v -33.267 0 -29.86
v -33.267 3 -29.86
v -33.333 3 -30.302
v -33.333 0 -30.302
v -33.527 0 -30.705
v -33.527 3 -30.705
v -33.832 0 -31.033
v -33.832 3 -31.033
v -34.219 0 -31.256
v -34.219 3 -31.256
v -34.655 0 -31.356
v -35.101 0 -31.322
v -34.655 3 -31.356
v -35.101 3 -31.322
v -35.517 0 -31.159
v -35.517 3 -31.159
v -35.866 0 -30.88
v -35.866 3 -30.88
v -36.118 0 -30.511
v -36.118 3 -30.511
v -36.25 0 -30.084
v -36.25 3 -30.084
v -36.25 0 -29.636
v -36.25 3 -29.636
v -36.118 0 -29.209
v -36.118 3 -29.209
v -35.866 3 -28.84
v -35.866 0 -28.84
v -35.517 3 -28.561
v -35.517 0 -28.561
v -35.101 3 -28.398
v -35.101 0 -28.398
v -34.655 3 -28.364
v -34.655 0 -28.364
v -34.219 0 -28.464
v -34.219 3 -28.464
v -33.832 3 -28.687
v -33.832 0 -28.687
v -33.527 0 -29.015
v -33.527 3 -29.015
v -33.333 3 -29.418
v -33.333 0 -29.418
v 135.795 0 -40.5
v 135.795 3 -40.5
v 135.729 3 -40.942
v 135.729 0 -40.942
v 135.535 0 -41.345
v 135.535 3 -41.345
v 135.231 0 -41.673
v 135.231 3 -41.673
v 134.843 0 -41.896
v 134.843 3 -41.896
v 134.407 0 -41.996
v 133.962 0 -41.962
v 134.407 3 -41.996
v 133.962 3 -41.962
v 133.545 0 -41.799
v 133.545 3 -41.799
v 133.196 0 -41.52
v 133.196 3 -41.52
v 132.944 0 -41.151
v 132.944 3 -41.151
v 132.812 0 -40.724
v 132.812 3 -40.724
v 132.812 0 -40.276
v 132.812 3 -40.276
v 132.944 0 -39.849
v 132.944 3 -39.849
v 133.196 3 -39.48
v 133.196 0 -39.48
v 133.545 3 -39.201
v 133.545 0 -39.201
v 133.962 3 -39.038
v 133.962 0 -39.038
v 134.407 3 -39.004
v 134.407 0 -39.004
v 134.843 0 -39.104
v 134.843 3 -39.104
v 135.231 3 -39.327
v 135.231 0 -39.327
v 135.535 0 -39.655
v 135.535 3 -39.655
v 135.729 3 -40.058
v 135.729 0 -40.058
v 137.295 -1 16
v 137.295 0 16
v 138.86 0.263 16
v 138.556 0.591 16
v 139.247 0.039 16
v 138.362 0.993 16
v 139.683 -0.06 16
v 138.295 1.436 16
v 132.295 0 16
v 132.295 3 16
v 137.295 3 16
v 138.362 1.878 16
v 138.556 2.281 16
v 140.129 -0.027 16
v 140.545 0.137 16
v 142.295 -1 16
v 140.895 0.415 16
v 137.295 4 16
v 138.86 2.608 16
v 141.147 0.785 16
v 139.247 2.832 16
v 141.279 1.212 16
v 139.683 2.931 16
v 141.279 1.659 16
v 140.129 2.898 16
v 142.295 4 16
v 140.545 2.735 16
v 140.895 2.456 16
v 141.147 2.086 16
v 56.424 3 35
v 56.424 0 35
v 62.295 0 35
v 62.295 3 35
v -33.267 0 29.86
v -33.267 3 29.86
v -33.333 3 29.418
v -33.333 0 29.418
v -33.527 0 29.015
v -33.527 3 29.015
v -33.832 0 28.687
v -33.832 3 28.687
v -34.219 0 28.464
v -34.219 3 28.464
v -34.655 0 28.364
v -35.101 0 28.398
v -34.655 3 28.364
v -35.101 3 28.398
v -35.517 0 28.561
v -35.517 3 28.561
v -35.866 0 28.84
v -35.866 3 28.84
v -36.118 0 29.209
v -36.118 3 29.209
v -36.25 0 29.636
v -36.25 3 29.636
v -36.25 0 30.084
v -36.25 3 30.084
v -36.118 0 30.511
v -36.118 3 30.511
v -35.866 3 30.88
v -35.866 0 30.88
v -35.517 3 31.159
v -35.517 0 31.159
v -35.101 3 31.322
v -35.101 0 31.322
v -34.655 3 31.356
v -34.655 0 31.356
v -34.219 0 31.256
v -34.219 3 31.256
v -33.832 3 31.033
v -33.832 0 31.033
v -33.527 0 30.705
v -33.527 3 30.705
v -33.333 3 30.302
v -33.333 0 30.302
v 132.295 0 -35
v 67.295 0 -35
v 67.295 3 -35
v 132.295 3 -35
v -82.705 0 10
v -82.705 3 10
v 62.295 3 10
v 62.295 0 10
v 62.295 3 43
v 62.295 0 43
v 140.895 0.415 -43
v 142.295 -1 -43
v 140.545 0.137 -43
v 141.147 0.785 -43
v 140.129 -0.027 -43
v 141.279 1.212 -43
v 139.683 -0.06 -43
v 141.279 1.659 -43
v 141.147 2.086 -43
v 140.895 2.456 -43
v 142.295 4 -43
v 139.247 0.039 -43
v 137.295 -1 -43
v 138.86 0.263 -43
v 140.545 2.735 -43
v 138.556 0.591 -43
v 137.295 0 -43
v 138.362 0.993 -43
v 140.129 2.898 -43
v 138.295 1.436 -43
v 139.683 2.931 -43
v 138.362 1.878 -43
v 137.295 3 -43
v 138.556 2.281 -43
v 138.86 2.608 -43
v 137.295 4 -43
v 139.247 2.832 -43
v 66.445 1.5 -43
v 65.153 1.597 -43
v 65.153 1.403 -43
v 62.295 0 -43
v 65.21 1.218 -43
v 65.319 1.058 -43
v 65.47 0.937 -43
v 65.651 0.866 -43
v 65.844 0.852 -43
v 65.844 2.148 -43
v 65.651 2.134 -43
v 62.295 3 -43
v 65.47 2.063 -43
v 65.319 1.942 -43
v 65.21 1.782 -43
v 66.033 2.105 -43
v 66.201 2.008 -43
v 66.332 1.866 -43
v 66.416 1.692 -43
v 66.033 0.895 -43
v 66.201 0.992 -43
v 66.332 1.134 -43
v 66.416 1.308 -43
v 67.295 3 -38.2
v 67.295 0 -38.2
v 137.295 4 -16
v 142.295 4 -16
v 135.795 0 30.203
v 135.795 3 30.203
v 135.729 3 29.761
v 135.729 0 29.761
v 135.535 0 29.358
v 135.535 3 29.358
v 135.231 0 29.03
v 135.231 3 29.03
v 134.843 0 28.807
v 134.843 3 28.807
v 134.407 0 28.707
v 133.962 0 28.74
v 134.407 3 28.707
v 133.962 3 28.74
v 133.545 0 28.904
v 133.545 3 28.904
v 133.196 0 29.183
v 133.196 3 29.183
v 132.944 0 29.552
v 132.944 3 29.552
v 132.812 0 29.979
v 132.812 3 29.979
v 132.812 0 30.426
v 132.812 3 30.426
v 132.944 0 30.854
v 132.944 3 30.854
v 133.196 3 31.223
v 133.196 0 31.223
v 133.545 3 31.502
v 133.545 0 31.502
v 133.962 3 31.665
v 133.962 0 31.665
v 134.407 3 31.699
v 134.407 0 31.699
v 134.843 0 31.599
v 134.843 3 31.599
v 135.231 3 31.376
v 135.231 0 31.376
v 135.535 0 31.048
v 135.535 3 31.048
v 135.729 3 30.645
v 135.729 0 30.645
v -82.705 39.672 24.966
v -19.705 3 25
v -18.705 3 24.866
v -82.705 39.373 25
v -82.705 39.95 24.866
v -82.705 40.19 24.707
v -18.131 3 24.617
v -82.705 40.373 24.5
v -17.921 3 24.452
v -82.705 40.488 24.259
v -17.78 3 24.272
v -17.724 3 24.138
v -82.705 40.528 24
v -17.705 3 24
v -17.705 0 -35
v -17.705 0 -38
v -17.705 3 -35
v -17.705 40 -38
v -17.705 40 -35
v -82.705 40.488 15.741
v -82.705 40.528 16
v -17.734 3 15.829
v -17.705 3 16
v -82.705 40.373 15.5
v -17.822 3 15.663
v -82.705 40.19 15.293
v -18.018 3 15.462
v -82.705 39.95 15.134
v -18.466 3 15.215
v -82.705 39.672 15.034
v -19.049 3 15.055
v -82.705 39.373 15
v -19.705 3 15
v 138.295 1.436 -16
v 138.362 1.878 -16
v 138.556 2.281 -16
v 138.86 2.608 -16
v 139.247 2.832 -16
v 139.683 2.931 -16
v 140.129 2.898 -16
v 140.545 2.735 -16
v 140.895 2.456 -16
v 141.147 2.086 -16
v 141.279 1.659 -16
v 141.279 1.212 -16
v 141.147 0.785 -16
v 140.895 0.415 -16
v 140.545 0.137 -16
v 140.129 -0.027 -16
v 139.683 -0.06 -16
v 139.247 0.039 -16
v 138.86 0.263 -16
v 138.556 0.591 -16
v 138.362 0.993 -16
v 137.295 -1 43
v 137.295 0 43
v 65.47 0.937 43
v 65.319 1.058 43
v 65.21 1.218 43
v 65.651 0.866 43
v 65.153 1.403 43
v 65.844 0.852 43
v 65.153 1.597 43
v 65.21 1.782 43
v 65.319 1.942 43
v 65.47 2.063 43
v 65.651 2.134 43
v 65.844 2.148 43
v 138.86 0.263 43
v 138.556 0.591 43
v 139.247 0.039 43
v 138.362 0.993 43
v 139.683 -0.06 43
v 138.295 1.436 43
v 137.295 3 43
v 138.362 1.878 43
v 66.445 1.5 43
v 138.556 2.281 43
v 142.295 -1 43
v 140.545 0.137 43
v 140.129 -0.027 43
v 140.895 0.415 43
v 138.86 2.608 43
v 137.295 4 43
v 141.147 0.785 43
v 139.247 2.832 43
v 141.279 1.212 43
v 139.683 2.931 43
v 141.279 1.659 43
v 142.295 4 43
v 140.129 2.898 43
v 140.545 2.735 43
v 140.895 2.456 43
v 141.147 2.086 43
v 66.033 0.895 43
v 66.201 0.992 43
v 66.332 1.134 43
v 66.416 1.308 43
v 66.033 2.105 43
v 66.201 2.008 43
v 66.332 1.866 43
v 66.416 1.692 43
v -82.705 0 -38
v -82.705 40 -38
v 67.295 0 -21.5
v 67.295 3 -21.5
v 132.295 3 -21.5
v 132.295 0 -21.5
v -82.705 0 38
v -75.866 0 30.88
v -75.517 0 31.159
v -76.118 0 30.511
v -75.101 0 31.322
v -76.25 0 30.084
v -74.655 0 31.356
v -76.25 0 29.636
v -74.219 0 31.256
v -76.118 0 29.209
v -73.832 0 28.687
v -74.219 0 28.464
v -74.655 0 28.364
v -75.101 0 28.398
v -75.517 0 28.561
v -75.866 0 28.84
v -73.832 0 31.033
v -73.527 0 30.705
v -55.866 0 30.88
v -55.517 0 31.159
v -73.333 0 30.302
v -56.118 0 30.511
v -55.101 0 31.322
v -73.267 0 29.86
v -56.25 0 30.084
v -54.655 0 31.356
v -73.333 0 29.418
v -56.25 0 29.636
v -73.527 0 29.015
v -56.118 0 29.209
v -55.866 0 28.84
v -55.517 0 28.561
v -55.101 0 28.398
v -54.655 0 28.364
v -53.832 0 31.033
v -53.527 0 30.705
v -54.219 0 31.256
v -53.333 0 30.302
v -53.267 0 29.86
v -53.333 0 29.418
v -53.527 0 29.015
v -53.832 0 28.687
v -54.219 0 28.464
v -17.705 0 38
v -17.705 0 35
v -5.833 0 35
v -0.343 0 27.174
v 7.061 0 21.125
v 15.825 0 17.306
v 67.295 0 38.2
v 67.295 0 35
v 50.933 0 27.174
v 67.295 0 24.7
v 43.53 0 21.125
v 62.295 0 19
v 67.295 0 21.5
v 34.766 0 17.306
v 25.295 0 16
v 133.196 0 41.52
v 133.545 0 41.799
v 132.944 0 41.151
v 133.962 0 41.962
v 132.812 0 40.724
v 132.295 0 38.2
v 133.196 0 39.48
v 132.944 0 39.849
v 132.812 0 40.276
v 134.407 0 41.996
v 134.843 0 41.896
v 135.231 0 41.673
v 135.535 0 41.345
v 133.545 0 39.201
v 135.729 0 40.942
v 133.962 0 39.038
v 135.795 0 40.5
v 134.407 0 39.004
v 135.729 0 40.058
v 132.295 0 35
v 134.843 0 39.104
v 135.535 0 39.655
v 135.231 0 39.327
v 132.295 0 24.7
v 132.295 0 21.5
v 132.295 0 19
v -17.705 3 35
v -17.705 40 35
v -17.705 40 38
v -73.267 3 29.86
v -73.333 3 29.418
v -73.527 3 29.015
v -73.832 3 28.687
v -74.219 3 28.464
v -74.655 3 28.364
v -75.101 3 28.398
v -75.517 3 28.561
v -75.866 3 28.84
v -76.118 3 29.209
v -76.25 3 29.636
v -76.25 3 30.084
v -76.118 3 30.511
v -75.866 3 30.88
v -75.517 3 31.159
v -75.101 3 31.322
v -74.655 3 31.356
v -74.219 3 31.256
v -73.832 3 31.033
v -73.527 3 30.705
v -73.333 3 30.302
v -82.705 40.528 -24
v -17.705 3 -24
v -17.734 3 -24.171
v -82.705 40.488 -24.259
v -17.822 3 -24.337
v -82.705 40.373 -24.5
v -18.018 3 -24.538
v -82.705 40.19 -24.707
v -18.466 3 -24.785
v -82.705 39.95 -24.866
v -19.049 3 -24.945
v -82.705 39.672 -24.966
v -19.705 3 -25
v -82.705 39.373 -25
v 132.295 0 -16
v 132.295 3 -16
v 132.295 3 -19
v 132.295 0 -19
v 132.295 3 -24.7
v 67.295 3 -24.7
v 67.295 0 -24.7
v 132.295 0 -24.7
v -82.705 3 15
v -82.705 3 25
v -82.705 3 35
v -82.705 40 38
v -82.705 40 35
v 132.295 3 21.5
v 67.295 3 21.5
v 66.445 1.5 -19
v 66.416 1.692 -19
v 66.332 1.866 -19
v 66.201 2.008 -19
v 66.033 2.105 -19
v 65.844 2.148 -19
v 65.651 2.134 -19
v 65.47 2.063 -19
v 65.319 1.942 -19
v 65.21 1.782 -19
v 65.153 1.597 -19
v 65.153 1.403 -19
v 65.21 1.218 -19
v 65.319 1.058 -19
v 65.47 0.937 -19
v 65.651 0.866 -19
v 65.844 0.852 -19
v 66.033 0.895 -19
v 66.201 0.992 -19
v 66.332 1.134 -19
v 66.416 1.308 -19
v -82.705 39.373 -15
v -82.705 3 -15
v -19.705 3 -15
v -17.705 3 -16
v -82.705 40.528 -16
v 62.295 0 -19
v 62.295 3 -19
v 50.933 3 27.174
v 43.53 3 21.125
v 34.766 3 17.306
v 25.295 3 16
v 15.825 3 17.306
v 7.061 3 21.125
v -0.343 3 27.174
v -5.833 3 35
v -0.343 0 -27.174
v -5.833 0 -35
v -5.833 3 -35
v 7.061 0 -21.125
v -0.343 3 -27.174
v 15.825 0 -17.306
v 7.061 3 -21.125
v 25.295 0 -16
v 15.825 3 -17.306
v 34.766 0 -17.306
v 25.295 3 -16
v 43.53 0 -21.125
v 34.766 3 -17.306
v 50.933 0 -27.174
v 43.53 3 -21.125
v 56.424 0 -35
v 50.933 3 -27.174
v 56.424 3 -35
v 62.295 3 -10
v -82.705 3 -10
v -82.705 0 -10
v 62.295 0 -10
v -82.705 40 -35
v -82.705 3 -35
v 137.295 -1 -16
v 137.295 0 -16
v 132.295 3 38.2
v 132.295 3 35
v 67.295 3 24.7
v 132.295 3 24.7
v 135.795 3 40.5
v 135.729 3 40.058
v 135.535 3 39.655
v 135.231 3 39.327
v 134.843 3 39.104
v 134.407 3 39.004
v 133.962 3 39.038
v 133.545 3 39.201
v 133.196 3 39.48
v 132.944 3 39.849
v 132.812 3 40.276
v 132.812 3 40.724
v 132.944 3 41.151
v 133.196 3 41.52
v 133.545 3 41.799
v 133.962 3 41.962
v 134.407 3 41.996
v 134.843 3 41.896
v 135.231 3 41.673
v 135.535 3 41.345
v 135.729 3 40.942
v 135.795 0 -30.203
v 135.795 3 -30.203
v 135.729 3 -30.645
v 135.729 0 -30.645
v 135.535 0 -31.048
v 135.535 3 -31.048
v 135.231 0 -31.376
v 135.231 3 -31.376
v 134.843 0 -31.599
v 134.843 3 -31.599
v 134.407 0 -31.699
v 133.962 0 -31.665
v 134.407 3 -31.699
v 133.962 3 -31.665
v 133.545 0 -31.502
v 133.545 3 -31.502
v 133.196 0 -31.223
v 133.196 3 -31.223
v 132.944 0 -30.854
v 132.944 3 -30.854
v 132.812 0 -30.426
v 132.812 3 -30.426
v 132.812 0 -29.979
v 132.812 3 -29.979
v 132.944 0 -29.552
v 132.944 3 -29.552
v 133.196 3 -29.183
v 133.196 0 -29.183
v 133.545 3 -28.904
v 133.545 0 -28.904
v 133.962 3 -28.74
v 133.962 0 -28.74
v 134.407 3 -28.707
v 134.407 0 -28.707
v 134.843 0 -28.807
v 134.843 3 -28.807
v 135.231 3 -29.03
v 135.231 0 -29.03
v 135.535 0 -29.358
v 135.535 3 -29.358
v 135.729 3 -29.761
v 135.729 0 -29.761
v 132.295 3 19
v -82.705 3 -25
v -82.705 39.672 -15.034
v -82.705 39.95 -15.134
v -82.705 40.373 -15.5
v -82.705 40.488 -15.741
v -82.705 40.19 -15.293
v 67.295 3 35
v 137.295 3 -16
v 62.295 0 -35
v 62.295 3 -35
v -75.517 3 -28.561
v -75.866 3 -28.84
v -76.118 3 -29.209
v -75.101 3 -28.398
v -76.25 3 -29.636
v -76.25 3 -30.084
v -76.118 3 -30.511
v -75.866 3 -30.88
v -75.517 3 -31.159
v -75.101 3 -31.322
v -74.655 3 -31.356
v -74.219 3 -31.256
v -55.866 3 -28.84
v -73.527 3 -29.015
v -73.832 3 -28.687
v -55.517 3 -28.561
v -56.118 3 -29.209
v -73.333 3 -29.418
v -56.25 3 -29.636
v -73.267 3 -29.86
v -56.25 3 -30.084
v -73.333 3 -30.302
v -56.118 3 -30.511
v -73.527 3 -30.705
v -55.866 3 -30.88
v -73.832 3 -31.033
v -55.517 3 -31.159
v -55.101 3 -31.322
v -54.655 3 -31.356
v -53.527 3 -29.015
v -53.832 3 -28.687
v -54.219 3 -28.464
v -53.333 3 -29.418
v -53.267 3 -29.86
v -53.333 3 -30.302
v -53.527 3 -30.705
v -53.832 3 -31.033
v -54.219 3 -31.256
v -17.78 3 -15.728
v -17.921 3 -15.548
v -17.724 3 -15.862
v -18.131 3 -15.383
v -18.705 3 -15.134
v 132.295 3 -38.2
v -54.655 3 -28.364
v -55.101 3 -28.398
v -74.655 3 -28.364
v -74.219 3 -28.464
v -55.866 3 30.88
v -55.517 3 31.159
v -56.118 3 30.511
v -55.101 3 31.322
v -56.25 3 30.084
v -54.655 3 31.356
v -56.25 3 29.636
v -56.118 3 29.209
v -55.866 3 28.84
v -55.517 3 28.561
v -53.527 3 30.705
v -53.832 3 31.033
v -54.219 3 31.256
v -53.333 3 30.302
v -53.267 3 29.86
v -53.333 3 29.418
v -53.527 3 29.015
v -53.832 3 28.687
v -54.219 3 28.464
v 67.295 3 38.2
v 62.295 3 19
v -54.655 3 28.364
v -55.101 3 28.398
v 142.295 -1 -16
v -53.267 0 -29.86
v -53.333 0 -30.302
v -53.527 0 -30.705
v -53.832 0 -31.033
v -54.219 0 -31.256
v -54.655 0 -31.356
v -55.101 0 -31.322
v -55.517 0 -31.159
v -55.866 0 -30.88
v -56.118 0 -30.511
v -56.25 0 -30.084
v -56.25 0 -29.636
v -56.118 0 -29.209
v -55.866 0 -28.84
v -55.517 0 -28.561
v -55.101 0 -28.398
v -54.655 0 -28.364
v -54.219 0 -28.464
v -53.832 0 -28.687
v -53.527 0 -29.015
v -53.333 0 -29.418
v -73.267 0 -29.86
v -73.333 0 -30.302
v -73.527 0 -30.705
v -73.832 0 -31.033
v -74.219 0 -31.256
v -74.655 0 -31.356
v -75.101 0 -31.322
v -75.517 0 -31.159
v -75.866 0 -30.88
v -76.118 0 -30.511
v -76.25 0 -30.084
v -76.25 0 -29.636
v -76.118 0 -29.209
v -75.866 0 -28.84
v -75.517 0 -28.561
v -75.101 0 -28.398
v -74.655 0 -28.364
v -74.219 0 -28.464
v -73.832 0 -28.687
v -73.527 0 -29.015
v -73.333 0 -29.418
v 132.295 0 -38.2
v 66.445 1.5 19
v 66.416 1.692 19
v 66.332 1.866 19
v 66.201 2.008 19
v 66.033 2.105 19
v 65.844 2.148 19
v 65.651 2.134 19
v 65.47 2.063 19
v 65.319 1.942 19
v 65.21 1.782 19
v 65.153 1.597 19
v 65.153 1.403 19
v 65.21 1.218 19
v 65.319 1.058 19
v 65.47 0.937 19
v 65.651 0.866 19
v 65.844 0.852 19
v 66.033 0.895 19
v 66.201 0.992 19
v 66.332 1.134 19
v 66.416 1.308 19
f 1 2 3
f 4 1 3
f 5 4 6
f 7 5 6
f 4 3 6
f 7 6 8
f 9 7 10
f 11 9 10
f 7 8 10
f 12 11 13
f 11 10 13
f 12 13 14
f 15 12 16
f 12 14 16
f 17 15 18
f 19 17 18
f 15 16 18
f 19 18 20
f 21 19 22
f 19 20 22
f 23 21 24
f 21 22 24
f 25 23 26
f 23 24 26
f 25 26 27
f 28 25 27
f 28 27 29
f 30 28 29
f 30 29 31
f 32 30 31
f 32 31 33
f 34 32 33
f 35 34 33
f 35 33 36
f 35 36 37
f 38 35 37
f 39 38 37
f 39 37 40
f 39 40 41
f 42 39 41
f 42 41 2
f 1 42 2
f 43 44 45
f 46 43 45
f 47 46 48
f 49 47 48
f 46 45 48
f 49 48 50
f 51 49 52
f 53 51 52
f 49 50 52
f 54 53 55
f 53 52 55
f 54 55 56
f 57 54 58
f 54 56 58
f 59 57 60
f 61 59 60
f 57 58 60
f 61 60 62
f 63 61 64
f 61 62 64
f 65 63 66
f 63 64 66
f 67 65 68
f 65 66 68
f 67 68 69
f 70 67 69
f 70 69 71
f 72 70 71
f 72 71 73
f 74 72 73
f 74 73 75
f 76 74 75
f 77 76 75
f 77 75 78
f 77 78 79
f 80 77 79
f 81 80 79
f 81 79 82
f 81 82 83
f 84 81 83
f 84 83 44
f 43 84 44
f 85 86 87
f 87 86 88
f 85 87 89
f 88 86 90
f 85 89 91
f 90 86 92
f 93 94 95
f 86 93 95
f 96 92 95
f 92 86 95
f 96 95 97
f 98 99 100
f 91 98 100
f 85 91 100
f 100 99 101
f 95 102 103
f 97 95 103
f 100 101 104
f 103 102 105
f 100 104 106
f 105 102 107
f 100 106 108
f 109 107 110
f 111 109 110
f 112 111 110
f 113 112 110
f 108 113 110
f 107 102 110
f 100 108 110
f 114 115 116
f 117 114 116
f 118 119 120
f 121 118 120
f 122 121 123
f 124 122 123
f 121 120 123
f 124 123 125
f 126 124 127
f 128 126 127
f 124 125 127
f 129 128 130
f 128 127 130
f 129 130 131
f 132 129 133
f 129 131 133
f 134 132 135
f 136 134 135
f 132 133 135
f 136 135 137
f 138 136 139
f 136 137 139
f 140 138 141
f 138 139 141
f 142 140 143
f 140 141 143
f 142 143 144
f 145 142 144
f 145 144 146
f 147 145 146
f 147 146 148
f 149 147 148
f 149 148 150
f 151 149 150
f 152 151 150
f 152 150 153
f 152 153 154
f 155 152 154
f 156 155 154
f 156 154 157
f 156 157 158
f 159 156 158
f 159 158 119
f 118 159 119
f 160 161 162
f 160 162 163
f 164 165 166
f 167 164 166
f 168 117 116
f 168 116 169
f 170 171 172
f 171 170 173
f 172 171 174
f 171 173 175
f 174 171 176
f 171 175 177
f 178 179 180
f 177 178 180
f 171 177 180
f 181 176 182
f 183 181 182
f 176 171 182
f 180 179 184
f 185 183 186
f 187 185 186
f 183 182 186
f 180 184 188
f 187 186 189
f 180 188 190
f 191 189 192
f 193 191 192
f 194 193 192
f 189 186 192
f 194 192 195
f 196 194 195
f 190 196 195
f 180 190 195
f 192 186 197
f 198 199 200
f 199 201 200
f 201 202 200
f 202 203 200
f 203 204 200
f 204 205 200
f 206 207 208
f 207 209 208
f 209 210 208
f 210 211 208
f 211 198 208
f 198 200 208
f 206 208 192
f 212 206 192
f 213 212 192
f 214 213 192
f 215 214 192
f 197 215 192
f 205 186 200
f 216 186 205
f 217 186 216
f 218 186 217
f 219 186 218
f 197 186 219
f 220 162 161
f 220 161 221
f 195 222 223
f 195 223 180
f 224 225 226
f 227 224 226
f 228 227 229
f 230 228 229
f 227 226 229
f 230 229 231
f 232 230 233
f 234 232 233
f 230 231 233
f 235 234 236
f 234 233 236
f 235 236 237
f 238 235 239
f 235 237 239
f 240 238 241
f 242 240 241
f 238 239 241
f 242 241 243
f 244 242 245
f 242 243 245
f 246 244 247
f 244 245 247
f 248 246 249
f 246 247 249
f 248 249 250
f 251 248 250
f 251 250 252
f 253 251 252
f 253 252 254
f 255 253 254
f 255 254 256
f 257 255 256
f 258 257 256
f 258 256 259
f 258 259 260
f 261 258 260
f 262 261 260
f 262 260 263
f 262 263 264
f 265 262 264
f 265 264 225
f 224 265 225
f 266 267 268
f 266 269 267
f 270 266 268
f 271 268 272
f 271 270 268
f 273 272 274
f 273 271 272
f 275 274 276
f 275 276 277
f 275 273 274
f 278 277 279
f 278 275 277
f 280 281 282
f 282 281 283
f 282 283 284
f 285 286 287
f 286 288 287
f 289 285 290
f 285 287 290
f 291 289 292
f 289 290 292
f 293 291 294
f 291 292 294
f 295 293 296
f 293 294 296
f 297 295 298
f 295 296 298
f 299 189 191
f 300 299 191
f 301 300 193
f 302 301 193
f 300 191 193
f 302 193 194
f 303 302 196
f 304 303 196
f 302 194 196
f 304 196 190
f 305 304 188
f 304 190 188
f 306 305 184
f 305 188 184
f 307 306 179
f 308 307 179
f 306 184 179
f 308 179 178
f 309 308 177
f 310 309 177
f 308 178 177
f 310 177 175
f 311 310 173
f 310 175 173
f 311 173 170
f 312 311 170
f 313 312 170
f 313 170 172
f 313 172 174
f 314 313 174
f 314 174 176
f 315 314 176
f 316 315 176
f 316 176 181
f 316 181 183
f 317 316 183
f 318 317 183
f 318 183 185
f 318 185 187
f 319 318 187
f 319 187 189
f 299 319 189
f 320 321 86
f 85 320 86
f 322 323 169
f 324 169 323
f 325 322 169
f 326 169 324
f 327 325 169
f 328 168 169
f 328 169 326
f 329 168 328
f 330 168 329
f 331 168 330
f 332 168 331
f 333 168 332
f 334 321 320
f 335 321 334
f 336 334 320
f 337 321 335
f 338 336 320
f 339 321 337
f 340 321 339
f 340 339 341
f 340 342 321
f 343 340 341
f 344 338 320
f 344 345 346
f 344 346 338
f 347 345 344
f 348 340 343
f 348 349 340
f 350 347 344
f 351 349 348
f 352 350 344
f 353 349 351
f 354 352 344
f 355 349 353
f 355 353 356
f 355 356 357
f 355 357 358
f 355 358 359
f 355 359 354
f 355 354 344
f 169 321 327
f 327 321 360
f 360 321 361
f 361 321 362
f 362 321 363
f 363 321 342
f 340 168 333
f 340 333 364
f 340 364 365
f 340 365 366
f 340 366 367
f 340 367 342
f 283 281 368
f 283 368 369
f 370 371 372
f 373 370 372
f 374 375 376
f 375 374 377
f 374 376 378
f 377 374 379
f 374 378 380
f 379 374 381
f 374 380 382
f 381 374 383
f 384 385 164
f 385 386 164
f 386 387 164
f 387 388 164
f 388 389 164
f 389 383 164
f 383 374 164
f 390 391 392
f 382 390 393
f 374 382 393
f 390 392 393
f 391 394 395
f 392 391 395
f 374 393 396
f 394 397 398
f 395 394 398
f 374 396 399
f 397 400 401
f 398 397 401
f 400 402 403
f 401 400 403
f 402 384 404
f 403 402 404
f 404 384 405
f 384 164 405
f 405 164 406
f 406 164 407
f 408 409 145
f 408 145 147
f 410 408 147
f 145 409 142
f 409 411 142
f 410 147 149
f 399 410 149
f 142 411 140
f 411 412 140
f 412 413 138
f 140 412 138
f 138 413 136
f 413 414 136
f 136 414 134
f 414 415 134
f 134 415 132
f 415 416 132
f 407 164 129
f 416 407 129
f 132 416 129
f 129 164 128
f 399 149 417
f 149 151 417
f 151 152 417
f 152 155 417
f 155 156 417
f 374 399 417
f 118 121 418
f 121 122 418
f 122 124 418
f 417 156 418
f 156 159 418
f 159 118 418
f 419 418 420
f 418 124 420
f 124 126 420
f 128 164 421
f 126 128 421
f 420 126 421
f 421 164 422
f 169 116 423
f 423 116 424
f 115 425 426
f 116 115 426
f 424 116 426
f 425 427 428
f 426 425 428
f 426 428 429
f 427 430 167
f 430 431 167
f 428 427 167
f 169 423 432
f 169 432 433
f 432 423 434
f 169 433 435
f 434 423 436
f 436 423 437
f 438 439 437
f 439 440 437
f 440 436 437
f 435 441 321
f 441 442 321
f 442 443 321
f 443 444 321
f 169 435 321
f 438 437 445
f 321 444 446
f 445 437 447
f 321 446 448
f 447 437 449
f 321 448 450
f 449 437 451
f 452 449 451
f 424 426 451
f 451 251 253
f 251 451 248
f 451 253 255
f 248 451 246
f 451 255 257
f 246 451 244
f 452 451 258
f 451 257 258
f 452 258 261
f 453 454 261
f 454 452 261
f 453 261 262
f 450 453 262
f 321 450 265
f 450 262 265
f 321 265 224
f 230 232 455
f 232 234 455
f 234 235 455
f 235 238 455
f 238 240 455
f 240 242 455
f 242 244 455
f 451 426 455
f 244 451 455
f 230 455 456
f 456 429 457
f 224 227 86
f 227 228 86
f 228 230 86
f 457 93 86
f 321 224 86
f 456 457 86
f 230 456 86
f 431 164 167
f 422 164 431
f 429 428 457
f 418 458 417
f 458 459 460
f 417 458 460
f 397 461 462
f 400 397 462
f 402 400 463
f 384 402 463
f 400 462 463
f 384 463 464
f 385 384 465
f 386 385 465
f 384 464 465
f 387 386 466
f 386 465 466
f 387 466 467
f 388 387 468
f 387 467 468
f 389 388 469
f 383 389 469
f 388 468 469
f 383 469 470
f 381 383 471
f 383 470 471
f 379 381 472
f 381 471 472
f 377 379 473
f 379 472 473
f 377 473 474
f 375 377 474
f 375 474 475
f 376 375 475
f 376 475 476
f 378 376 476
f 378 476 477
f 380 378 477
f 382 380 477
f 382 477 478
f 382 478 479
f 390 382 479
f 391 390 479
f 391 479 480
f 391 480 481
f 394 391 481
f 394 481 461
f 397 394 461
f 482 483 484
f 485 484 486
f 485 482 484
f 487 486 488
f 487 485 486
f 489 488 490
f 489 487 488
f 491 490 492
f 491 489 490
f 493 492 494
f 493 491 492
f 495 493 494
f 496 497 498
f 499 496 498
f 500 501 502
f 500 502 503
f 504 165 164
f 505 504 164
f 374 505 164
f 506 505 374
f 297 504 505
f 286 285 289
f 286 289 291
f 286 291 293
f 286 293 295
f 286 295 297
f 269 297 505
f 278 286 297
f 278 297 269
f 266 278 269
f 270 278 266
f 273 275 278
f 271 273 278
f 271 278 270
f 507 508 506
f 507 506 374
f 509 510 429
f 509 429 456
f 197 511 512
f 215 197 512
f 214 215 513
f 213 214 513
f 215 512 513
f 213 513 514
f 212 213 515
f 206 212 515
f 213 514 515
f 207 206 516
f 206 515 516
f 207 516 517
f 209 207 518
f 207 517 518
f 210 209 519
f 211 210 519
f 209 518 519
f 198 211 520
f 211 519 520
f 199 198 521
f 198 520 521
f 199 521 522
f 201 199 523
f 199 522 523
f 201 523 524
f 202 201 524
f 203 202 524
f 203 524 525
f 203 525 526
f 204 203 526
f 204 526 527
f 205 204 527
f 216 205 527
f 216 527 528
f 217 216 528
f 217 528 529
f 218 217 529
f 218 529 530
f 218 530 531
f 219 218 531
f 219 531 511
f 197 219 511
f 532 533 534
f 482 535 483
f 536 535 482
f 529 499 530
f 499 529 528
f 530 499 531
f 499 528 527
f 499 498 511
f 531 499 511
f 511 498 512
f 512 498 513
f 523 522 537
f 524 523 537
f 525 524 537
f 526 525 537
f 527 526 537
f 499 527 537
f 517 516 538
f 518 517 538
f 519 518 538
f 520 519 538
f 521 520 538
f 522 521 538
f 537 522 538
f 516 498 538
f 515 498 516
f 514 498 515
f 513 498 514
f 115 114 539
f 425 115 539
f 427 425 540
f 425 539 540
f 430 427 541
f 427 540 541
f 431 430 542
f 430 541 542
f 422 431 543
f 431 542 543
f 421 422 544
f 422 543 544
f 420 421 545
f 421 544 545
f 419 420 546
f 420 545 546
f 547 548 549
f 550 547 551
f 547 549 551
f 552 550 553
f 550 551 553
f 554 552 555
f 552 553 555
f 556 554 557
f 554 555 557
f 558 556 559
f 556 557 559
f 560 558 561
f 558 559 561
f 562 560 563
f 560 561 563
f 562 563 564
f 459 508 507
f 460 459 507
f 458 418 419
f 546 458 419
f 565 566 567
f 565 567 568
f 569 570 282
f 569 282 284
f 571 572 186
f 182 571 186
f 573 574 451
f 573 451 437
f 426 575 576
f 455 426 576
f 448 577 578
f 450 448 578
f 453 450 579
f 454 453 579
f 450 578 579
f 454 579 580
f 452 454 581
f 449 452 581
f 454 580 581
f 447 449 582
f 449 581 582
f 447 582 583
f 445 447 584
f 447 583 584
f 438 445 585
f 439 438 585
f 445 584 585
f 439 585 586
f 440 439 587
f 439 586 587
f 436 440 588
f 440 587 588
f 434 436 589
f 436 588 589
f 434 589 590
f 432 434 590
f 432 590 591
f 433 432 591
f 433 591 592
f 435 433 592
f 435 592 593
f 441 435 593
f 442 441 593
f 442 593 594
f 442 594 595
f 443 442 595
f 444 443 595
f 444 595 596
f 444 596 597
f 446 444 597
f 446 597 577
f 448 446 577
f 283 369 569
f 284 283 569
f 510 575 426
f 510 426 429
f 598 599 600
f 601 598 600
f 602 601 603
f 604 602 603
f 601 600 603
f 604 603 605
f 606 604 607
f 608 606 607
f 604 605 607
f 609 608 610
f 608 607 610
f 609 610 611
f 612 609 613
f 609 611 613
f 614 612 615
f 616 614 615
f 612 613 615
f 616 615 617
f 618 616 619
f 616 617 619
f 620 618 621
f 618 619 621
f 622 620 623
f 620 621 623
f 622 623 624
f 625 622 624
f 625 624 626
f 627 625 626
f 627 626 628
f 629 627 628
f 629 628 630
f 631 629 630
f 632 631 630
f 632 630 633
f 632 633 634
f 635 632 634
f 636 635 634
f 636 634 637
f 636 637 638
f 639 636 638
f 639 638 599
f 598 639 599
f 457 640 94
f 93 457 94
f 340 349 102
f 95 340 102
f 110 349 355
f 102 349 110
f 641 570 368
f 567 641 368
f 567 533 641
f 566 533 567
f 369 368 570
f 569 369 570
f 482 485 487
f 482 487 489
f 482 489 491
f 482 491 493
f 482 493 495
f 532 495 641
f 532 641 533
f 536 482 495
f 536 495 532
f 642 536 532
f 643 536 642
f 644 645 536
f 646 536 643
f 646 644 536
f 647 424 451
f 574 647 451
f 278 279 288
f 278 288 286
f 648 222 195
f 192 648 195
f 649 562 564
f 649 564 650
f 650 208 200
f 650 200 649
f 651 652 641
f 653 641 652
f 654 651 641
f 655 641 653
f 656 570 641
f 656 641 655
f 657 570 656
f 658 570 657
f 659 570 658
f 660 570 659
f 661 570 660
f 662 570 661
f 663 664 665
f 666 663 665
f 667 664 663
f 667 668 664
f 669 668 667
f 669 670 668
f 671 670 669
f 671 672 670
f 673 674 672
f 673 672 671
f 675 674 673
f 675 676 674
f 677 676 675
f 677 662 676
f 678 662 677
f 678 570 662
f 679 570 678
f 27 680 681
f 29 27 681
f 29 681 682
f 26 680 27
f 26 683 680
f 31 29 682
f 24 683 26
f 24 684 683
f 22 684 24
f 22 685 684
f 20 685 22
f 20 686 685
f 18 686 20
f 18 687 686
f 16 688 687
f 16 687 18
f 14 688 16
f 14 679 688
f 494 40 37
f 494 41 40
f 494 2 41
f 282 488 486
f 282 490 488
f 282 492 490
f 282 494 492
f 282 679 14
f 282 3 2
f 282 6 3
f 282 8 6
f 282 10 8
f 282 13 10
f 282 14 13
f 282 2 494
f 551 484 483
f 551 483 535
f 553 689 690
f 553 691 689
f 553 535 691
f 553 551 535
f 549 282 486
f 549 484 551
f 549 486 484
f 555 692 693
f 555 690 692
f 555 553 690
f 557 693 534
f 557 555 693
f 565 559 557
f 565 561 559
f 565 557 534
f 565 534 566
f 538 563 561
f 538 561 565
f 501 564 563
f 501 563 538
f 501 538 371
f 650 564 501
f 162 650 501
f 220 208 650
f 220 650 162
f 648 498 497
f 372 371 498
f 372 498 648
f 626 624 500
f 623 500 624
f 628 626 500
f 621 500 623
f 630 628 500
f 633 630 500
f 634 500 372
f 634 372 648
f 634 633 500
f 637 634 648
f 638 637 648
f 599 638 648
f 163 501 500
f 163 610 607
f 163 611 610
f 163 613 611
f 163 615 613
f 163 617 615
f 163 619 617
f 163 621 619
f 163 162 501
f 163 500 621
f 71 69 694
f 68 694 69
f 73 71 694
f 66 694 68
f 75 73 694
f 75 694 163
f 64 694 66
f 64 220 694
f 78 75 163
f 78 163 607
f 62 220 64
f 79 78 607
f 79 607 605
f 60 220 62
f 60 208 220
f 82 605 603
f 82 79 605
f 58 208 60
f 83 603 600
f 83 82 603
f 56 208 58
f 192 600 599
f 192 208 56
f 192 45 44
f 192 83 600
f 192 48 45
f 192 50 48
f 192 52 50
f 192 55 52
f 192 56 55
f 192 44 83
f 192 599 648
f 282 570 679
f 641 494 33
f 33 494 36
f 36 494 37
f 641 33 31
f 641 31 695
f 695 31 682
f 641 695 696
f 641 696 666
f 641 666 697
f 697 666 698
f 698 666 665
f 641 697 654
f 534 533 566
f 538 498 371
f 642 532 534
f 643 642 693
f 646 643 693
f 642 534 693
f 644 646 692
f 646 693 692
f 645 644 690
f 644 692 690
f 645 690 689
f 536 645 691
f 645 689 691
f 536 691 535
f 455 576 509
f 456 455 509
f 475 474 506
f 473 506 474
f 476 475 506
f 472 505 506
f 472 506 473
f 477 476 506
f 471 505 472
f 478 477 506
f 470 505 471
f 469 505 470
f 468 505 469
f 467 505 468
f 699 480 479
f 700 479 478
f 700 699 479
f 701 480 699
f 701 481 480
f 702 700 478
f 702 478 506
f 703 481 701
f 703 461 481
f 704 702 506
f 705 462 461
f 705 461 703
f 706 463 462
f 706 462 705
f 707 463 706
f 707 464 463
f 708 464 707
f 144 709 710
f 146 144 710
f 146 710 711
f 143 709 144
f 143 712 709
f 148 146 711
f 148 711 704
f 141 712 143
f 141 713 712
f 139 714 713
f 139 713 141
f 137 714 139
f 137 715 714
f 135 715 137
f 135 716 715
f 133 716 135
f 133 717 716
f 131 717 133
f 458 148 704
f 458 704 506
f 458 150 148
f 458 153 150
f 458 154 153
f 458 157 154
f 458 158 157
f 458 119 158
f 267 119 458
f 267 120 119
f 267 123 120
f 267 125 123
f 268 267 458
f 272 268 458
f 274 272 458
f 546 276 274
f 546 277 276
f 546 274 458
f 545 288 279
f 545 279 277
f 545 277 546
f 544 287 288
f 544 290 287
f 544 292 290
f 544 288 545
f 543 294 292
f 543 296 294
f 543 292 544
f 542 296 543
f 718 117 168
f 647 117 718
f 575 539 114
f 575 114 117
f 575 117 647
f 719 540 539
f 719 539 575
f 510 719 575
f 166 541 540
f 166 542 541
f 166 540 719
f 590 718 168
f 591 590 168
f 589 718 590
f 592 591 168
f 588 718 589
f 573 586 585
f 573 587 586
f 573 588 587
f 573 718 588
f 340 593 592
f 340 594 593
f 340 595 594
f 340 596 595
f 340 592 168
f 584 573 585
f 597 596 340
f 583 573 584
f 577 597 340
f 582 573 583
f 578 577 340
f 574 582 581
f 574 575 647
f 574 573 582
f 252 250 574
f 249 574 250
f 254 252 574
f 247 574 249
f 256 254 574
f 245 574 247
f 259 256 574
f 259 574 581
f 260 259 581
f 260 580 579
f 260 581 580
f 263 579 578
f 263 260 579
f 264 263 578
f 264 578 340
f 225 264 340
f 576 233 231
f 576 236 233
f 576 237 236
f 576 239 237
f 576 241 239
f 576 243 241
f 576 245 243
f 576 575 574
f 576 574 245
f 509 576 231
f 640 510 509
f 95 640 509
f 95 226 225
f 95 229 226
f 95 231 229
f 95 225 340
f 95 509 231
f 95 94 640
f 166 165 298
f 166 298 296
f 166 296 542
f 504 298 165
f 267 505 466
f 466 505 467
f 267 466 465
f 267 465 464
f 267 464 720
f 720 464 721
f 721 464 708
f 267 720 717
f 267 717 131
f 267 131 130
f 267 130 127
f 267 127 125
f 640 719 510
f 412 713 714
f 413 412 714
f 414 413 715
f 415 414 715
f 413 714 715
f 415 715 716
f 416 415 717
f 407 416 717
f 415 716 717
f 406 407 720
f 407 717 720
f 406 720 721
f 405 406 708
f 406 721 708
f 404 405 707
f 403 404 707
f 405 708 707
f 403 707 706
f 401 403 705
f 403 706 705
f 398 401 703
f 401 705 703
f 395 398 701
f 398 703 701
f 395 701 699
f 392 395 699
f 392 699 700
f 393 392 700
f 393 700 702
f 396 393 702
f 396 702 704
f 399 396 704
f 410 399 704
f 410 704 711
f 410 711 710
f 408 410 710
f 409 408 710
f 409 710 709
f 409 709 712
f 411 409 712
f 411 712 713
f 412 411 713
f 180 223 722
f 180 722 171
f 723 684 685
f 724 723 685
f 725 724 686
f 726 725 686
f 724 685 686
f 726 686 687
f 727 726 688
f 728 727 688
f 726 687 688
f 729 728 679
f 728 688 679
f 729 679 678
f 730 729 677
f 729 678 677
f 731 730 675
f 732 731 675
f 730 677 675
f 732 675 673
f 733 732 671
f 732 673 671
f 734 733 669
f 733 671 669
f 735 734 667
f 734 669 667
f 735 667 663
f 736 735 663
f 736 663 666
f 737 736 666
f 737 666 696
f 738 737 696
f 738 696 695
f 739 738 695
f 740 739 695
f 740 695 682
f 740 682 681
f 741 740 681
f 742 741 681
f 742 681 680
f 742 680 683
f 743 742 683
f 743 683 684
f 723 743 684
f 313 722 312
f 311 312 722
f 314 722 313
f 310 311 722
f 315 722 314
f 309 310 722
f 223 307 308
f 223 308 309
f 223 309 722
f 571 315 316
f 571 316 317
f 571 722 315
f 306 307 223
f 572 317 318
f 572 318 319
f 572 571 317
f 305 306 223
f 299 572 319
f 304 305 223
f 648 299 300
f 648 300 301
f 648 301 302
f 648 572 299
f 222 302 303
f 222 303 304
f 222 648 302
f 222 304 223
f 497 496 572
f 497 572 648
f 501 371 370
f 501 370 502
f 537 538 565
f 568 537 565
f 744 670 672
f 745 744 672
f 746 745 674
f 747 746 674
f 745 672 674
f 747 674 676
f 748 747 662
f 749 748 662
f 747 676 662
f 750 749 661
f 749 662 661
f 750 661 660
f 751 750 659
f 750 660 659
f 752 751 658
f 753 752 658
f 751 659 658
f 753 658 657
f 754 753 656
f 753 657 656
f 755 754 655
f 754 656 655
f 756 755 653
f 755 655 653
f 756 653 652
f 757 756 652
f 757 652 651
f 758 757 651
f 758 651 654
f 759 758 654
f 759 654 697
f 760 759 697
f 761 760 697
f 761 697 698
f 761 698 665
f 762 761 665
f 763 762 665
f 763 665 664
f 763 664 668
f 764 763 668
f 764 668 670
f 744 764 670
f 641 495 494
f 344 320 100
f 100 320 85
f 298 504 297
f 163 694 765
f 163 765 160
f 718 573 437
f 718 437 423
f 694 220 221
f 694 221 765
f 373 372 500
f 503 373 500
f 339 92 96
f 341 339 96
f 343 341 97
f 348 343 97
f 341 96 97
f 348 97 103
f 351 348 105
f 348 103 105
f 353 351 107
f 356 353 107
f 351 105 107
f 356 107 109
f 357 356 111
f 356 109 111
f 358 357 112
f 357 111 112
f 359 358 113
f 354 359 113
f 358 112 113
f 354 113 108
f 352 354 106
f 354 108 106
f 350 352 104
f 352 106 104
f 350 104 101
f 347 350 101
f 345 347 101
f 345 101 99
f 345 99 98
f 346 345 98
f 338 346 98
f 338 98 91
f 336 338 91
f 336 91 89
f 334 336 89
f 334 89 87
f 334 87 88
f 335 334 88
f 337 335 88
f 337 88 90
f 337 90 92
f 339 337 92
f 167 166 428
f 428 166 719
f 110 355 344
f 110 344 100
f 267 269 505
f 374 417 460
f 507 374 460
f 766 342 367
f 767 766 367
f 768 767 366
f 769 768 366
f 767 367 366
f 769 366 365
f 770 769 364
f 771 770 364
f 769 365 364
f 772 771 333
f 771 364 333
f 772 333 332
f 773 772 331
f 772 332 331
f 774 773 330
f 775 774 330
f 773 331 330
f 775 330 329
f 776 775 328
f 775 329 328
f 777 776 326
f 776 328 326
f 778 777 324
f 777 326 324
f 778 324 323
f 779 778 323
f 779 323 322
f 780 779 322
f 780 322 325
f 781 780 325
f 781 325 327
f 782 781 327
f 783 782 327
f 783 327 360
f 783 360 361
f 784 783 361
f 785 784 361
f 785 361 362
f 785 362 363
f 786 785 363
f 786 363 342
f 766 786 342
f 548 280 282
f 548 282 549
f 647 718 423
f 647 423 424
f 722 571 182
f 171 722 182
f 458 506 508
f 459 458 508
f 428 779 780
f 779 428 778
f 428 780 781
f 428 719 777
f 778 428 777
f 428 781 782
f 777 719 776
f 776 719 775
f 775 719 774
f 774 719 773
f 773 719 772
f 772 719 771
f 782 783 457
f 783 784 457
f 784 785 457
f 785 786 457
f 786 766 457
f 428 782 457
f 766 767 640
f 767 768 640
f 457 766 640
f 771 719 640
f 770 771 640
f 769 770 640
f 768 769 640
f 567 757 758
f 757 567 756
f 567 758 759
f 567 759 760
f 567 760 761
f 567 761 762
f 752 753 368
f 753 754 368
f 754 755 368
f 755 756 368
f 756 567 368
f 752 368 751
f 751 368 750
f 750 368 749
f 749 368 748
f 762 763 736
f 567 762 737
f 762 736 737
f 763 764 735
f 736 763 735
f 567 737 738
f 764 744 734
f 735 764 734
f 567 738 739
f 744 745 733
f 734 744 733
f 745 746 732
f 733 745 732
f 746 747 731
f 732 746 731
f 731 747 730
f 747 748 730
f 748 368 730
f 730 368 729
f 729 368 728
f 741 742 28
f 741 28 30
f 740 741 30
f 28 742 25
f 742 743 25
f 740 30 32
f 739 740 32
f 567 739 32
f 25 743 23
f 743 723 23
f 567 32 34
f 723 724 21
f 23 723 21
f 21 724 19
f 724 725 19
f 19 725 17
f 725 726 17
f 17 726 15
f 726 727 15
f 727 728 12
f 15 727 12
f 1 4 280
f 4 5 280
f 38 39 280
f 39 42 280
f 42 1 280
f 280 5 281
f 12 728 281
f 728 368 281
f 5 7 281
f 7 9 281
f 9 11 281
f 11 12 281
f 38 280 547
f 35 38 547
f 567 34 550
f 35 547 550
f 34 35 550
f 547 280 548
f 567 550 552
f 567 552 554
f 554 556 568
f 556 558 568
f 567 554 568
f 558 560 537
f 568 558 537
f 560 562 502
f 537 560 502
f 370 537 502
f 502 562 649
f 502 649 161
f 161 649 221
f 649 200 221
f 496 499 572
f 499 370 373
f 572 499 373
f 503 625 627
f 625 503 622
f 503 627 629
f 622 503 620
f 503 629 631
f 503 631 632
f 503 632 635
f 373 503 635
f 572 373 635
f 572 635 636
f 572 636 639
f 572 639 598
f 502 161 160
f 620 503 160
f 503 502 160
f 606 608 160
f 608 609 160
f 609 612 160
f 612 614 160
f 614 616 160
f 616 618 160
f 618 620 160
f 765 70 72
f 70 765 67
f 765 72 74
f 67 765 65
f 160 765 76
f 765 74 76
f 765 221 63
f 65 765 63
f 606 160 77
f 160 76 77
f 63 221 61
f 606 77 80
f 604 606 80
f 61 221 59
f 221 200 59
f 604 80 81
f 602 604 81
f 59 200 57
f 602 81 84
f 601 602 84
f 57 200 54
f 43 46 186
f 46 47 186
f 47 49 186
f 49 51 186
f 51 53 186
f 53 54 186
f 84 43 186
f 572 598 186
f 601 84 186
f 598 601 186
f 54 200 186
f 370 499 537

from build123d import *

# Parameters (mm, degrees)
SKETCH_1_W               = 220
SKETCH_1_H               = 70
EXTRUDE_1_DEPTH          = 3
EXTRUDE_2_DEPTH          = 25
EXTRUDE_2_DEPTH_BACK     = 25
SKETCH_6_W               = 30
SKETCH_6_H               = 37.527767497
CUT_EXTRUDE_4_DEPTH      = 221
SKETCH_7_R               = 35
CUT_EXTRUDE_5_DEPTH      = 4
SKETCH_8_W               = 3
SKETCH_8_H               = 40
EXTRUDE_3_DEPTH          = 65
SKETCH_9_R               = 1.5
CUT_EXTRUDE_6_DEPTH      = 4
FILLET_5_R               = 1
SKETCH_10_W              = 65
SKETCH_10_H              = 20
CUT_EXTRUDE_7_DEPTH      = 4
EXTRUDE_4283_DEPTH       = 3
SKETCH_12_W              = 65
SKETCH_12_H              = 3.2
CUT_EXTRUDE_4965_DEPTH   = 3
CUT_EXTRUDE_9_DEPTH      = 38.527767497
CUT_EXTRUDE_9_DEPTH_BACK = 3
SKETCH_14_R              = 0.65
CUT_EXTRUDE_10_DEPTH     = 87
SKETCH_17_W              = 27
SKETCH_17_H              = 5
EXTRUDE_4_DEPTH          = 5
SKETCH_19_R              = 1.5
CUT_EXTRUDE_11_DEPTH     = 87
SKETCH_20_R              = 1.5
CUT_EXTRUDE_12_DEPTH     = 5
SKETCH_21_W              = 80
SKETCH_21_H              = 20
CUT_EXTRUDE_15_DEPTH     = 10


with BuildPart() as part:
    # 草图1 → 凸台-拉伸1 (new body)
    with BuildSketch(Plane(origin=(0, 0, 0), x_dir=(1, 0, 0), z_dir=(0, 1, 0))):
        with Locations((27.295373665, 0)):
            Rectangle(SKETCH_1_W, SKETCH_1_H)
    extrude(amount=EXTRUDE_1_DEPTH)

    # 草图2 → 凸台-拉伸2 (add, two sides)
    with BuildSketch(Plane.XY) as extrude_2_sk:
        Polygon((-82.704626335, 40.527767497), (-82.704626335, 3), (-17.704626335, 3), align=None)
    extrude(amount=EXTRUDE_2_DEPTH)
    extrude(extrude_2_sk.sketch, amount=-EXTRUDE_2_DEPTH_BACK)

    # 草图6 → 切除-拉伸4 (cut, through all)
    with BuildSketch(Plane.ZY.offset(82.704626335)):
        with Locations((0, 21.763883748)):
            Rectangle(SKETCH_6_W, SKETCH_6_H)
    extrude(amount=-CUT_EXTRUDE_4_DEPTH, mode=Mode.SUBTRACT)

    # 草图7 → 切除-拉伸5 (cut, through all)
    with BuildSketch(Plane(origin=(0, 3, 0), x_dir=(1, 0, 0), z_dir=(0, 1, 0))):
        with Locations((25.295373665, 51)):
            Circle(SKETCH_7_R)
        with Locations((25.295373665, -51)):
            Circle(SKETCH_7_R)
    extrude(amount=-CUT_EXTRUDE_5_DEPTH, mode=Mode.SUBTRACT)

    # 草图8 → 凸台-拉伸3 (add)
    with BuildSketch(Plane.ZY.offset(82.704626335)):
        with Locations((36.5, 20)):
            Rectangle(SKETCH_8_W, SKETCH_8_H)
        with Locations((-36.5, 20)):
            Rectangle(SKETCH_8_W, SKETCH_8_H)
    extrude(amount=-EXTRUDE_3_DEPTH)

    # 草图9 → 切除-拉伸6 (cut, through all)
    with BuildSketch(Plane(origin=(0, 3, 0), x_dir=(1, 0, 0), z_dir=(0, 1, 0))):
        with Locations((-74.766784803, 29.860059225)):
            Circle(SKETCH_9_R)
        with Locations((-54.766784803, 29.860059225)):
            Circle(SKETCH_9_R)
        with Locations((-34.766784803, 29.860059225)):
            Circle(SKETCH_9_R)
        with Locations((-34.766784803, -29.860059225)):
            Circle(SKETCH_9_R)
        with Locations((-54.766784803, -29.860059225)):
            Circle(SKETCH_9_R)
        with Locations((-74.766784803, -29.860059225)):
            Circle(SKETCH_9_R)
    extrude(amount=-CUT_EXTRUDE_6_DEPTH, mode=Mode.SUBTRACT)

    # 圆角5
    fillet_5_edges = [part.edges().sort_by_distance(p)[0] for p in [
        (-50.204626335, 21.763883749, -25),
        (-50.204626335, 21.763883749, 25),
        (-50.204626335, 21.763883749, -15),
        (-50.204626335, 21.763883749, 15),
    ]]
    fillet(fillet_5_edges, radius=FILLET_5_R)

    # 草图10 → 切除-拉伸7 (cut, through all)
    with BuildSketch(Plane(origin=(0, 3, 0), x_dir=(1, 0, 0), z_dir=(0, 1, 0))):
        with Locations((-50.204626335, 0)):
            Rectangle(SKETCH_10_W, SKETCH_10_H)
    extrude(amount=-CUT_EXTRUDE_7_DEPTH, mode=Mode.SUBTRACT)

    # 草图11 → Extrude 4283 (add)
    with BuildSketch(Plane(origin=(0, 3, 0), x_dir=(1, 0, 0), z_dir=(0, 1, 0))):
        Polygon((132.295373665, 35), (137.295373665, 35), (137.295373665, 43), (62.295373665, 43), (62.295373665, 35), (67.295373665, 35), (67.295373665, 38.2), (132.295373665, 38.2), align=None)
        Polygon((137.295373665, -43), (137.295373665, -35), (132.295373665, -35), (132.295373665, -38.2), (67.295373665, -38.2), (67.295373665, -35), (62.295373665, -35), (62.295373665, -43), align=None)
    extrude(amount=-EXTRUDE_4283_DEPTH)

    # 草图12 → Cut-Extrude 4965 (cut)
    with BuildSketch(Plane(origin=(0, 3, 0), x_dir=(1, 0, 0), z_dir=(0, 1, 0))):
        with Locations((99.795373665, -23.1)):
            Rectangle(SKETCH_12_W, SKETCH_12_H)
        with Locations((99.795373665, 23.1)):
            Rectangle(SKETCH_12_W, SKETCH_12_H)
    extrude(amount=-CUT_EXTRUDE_4965_DEPTH, mode=Mode.SUBTRACT)

    # 草图13 → 切除-拉伸9 (cut, two sides)
    with BuildSketch(Plane(origin=(0, 3, 0), x_dir=(1, 0, 0), z_dir=(0, 1, 0))) as cut_extrude_9_sk:
        Polygon((62.295373665, 19), (62.295373665, -19), (132.295373665, -19), (132.295373665, -16), (137.295373665, -16), (137.295373665, 0), (137.295373665, 16), (132.295373665, 16), (132.295373665, 19), align=None)
    extrude(amount=CUT_EXTRUDE_9_DEPTH, mode=Mode.SUBTRACT)
    extrude(cut_extrude_9_sk.sketch, amount=-CUT_EXTRUDE_9_DEPTH_BACK, mode=Mode.SUBTRACT)

    # 草图14 → 切除-拉伸10 (cut, through all)
    with BuildSketch(Plane.XY.offset(43)):
        with Locations((65.795373665, 1.5)):
            Circle(SKETCH_14_R)
    extrude(amount=-CUT_EXTRUDE_10_DEPTH, mode=Mode.SUBTRACT)

    # 草图17 → 凸台-拉伸4 (add)
    with BuildSketch(Plane(origin=(137.295373665, 0, 0), x_dir=(0, 0, -1), z_dir=(1, 0, 0))):
        with Locations((29.5, 1.5)):
            Rectangle(SKETCH_17_W, SKETCH_17_H)
        with Locations((-29.5, 1.5)):
            Rectangle(SKETCH_17_W, SKETCH_17_H)
    extrude(amount=EXTRUDE_4_DEPTH)

    # 草图19 → 切除-拉伸11 (cut, through all)
    with BuildSketch(Plane(origin=(0, 0, -43), x_dir=(-1, 0, 0), z_dir=(0, 0, -1))):
        with Locations((-139.795373665, 1.435601605)):
            Circle(SKETCH_19_R)
    extrude(amount=-CUT_EXTRUDE_11_DEPTH, mode=Mode.SUBTRACT)

    # 草图20 → 切除-拉伸12 (cut, through all)
    with BuildSketch(Plane(origin=(0, 3, 0), x_dir=(1, 0, 0), z_dir=(0, 1, 0))):
        with Locations((134.295373665, 30.202873248)):
            Circle(SKETCH_20_R)
        with Locations((134.295373665, -30.202873248)):
            Circle(SKETCH_20_R)
        with Locations((134.295373665, 40.5)):
            Circle(SKETCH_20_R)
        with Locations((134.295373665, -40.5)):
            Circle(SKETCH_20_R)
    extrude(amount=-CUT_EXTRUDE_12_DEPTH, mode=Mode.SUBTRACT)

    # 草图21 → 切除-拉伸15 (cut)
    with BuildSketch(Plane(origin=(0, 3, 0), x_dir=(1, 0, 0), z_dir=(0, 1, 0))):
        with Locations((22.295373665, 0)):
            Rectangle(SKETCH_21_W, SKETCH_21_H)
    extrude(amount=-CUT_EXTRUDE_15_DEPTH, mode=Mode.SUBTRACT)


solid = part.part
